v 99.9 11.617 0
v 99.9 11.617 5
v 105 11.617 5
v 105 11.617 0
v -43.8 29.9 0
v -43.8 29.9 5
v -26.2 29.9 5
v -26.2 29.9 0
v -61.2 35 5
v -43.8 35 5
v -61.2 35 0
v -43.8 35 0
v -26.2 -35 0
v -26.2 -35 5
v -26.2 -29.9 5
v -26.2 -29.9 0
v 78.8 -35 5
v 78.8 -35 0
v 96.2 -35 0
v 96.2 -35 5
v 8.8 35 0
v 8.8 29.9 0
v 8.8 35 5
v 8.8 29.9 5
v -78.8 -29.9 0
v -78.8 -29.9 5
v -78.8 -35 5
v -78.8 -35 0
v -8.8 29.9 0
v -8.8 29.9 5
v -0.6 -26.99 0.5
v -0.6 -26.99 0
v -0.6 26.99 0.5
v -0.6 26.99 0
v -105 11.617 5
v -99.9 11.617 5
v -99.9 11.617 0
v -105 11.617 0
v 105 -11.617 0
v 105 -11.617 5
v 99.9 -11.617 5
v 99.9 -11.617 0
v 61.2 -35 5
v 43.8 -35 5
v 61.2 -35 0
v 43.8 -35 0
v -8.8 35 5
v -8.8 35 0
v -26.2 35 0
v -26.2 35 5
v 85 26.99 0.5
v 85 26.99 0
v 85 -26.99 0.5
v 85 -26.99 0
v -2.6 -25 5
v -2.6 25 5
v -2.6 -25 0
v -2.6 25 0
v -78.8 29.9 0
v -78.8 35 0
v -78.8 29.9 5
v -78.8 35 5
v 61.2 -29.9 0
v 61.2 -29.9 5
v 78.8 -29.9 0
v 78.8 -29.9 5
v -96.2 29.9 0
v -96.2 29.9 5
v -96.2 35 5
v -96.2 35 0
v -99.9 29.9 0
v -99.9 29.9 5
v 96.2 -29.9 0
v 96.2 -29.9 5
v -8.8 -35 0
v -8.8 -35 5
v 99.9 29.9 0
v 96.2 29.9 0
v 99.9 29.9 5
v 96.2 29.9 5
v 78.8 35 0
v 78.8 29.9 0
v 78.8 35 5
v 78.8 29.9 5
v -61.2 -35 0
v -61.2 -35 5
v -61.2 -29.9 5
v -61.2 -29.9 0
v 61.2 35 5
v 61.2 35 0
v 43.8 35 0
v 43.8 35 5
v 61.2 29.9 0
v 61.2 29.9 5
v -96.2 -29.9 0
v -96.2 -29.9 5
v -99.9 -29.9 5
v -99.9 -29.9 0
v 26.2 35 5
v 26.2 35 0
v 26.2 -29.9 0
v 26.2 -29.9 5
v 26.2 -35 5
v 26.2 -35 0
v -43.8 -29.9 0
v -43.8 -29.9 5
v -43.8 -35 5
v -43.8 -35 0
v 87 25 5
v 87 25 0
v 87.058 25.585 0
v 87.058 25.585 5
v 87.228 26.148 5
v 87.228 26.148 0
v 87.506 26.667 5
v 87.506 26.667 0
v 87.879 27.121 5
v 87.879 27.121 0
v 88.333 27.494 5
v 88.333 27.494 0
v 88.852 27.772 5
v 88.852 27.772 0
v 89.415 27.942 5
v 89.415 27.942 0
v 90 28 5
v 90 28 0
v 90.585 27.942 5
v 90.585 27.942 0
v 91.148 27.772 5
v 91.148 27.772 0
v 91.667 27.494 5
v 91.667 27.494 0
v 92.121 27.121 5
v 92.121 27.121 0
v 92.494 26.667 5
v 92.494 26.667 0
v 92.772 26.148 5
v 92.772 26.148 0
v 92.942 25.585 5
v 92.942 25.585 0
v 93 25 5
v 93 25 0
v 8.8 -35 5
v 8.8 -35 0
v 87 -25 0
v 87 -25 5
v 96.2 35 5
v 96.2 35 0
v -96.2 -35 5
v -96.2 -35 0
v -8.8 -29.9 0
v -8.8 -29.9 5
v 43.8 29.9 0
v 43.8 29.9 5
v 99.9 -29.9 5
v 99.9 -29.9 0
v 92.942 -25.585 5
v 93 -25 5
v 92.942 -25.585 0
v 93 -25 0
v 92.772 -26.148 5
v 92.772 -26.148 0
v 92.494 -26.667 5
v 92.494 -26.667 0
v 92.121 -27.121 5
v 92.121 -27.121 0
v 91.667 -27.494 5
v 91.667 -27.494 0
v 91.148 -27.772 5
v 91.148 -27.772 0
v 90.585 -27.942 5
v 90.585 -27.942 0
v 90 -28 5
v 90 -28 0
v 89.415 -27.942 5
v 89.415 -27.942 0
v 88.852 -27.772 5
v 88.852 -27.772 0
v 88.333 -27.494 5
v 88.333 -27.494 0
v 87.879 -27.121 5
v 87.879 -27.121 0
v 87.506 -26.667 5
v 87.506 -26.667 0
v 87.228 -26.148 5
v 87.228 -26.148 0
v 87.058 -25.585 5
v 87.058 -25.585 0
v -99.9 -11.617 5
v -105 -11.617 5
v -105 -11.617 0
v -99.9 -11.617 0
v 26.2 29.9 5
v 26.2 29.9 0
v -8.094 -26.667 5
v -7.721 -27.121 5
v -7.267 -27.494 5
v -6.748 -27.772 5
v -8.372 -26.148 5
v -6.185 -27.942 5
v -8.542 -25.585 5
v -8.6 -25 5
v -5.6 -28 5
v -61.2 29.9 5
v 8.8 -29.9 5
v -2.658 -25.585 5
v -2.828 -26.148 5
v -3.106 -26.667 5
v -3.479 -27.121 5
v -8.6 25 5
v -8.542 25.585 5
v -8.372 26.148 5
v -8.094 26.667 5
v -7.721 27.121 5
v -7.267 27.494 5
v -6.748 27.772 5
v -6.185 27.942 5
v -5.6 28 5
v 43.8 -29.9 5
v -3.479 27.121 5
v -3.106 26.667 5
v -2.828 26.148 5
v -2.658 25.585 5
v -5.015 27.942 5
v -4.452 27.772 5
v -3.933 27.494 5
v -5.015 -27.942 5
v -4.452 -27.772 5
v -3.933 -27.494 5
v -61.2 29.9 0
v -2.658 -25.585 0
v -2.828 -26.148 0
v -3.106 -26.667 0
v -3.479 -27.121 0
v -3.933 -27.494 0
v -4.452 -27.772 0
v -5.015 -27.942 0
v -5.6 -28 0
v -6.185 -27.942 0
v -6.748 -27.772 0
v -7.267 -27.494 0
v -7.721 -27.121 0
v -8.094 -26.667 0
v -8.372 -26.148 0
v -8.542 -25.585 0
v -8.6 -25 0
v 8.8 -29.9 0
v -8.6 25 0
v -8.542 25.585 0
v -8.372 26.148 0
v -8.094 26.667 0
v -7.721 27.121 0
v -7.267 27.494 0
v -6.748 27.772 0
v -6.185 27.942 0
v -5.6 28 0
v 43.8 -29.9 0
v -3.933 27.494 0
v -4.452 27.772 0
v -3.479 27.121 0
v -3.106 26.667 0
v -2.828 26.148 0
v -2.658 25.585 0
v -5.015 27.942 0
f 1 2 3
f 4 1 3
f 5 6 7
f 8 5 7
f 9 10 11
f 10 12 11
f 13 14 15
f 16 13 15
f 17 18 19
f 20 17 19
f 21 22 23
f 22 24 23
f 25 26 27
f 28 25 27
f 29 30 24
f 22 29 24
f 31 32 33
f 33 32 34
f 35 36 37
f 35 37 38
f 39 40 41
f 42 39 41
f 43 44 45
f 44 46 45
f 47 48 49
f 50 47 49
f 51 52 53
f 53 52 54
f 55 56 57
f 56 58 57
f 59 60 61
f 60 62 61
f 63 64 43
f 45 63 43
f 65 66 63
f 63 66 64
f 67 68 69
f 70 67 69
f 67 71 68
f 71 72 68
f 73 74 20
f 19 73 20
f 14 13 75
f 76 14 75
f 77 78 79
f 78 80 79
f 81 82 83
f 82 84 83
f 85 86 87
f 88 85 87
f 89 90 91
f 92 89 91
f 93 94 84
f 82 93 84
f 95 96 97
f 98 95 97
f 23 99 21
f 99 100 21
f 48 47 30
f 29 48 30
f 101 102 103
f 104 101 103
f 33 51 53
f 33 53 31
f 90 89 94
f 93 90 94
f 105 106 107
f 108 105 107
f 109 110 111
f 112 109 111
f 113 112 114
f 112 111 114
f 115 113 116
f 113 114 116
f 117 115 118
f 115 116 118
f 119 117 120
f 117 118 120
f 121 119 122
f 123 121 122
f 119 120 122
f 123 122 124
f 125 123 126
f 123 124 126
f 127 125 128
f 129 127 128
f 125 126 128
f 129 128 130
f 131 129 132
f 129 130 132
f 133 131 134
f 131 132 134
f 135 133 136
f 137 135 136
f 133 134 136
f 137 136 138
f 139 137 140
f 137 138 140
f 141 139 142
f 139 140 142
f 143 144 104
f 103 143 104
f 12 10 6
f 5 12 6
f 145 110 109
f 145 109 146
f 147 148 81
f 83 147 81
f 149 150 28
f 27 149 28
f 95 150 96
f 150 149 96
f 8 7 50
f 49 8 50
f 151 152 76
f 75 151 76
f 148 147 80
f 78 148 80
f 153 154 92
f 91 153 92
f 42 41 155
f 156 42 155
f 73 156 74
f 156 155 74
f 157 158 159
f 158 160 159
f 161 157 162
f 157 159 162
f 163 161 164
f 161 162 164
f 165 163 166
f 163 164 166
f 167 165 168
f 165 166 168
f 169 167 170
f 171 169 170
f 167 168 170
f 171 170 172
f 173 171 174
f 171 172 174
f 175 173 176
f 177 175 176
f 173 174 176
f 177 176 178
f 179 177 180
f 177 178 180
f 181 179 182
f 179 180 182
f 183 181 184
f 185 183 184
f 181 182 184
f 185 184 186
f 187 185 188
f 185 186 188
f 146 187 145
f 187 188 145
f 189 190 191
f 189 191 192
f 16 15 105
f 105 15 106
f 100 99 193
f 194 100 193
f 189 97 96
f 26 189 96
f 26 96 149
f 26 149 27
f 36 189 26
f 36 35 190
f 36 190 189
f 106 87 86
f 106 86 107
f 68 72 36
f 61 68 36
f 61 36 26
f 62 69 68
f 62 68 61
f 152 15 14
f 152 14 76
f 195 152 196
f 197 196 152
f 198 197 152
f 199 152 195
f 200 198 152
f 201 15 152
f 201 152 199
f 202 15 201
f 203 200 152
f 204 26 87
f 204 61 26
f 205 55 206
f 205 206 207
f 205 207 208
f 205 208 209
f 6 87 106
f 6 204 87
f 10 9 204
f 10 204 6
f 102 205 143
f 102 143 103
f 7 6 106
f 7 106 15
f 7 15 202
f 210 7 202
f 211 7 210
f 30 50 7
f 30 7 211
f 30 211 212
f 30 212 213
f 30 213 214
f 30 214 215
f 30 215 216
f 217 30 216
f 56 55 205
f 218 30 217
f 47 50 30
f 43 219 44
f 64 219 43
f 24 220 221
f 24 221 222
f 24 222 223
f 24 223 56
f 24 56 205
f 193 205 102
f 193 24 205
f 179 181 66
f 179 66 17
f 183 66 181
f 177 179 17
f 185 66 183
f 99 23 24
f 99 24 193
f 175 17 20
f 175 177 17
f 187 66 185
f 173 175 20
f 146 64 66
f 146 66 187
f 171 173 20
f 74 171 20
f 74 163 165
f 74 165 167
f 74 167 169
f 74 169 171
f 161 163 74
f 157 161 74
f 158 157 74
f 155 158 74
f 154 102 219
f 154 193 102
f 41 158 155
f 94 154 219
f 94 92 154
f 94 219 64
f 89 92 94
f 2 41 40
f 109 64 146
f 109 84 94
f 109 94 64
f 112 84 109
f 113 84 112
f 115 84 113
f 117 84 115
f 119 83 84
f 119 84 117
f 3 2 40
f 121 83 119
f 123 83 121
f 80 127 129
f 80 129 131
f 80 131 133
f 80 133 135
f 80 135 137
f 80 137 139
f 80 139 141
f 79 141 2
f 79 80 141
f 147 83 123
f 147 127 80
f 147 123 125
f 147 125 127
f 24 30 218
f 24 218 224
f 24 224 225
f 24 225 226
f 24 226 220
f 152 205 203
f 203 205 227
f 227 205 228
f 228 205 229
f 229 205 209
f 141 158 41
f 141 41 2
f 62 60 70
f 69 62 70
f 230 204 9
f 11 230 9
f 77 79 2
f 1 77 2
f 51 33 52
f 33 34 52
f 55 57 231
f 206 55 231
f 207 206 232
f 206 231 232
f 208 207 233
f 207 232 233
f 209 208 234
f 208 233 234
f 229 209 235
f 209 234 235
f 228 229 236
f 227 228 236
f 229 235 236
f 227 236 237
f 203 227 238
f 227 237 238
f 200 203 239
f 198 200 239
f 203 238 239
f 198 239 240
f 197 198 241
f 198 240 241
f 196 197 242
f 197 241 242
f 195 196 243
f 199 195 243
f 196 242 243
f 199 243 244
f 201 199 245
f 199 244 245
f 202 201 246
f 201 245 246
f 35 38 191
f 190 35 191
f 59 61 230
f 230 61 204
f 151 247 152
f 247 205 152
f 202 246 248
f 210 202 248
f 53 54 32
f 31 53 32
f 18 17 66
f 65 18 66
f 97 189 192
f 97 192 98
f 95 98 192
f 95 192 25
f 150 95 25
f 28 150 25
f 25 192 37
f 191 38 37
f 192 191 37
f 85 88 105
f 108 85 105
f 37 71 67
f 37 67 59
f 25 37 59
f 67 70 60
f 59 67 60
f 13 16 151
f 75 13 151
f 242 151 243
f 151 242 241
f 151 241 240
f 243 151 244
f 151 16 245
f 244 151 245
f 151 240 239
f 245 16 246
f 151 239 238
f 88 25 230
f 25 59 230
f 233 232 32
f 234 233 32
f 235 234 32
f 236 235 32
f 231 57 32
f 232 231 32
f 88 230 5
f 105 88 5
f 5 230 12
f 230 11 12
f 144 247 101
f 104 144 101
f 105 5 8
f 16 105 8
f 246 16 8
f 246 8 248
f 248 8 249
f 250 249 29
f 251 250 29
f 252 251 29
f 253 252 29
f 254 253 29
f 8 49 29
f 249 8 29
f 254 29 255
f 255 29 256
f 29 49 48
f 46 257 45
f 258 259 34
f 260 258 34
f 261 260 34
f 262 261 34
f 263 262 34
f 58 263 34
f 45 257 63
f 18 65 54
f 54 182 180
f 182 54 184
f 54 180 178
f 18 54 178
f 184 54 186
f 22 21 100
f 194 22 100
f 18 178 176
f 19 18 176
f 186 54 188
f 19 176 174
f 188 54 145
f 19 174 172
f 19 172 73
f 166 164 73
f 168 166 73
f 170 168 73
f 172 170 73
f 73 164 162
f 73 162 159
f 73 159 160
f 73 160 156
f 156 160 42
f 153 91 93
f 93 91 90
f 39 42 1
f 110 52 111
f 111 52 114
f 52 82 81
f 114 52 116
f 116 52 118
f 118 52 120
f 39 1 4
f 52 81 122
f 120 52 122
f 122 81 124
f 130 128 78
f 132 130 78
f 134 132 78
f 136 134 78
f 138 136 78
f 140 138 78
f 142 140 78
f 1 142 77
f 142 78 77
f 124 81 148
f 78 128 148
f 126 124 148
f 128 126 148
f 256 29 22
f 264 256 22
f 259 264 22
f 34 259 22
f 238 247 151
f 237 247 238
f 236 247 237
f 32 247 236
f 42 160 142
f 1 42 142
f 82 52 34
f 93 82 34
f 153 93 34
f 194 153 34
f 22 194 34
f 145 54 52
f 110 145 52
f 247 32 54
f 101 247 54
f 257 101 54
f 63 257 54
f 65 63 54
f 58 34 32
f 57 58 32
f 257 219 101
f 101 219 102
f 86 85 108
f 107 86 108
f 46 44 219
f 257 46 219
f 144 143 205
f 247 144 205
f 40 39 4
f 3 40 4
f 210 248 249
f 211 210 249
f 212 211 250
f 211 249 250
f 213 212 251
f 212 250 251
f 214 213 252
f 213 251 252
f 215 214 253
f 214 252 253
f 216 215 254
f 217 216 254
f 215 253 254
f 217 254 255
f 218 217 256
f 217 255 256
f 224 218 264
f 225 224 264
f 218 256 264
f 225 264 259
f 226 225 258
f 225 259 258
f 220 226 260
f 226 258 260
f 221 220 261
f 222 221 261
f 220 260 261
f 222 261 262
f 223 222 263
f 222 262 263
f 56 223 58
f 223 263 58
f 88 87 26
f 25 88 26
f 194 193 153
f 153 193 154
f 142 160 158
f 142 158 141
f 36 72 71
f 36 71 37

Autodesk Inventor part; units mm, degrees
ref_plane "YZ Plane" through (0, 0, 0) normal (1, 0, 0) x (0, 1, 0)
ref_plane "XZ Plane" through (0, 0, 0) normal (0, 1, 0) x (-1, 0, 0)
ref_plane "XY Plane" through (0, 0, 0) normal (0, 0, 1) x (1, 0, 0)
sketch "Sketch1" plane through (0, 0, 0) normal (0, 0, 1) x (1, 0, 0)
  line L0 (-105, -35) -> (105, -35)
  line L1 (105, -35) -> (105, 35)
  line L2 (105, 35) -> (-105, 35)
  line L3 (-105, 35) -> (-105, -35)
  line L4 (-105, -35) -> (105, 35) construction
  line L5 (105, -35) -> (-105, 35) construction
  point P0 (0, 0)
  dimension "d0" = 210
  dimension "d1" = 70
extrude "Extrusion1" add sketch "Sketch1" along normal blind 5
sketch "Sketch2" plane through (0, 0, 5) normal (0, 0, 1) x (1, 0, 0)
  line L0 (105, 35) -> (-105, 35) projected
  line L1 (-8.8, 35) -> (-8.8, 29.9)
  line L2 (-8.8, 29.9) -> (8.8, 29.9)
  line L3 (8.8, 29.9) -> (8.8, 35)
  line L4 (-43.8, 35) -> (-43.8, 29.9)
  line L5 (-43.8, 29.9) -> (-26.2, 29.9)
  line L6 (-26.2, 29.9) -> (-26.2, 35)
  line L7 (-78.8, 35) -> (-78.8, 29.9)
  line L8 (-78.8, 29.9) -> (-61.2, 29.9)
  line L9 (-61.2, 29.9) -> (-61.2, 35)
  line L10 (-113.8, 35) -> (-113.8, 29.9)
  line L11 (-113.8, 29.9) -> (-96.2, 29.9)
  line L12 (-96.2, 29.9) -> (-96.2, 35)
  line L13 (43.8, 29.9) -> (43.8, 35)
  line L14 (26.2, 29.9) -> (43.8, 29.9)
  line L15 (26.2, 35) -> (26.2, 29.9)
  line L16 (78.8, 29.9) -> (78.8, 35)
  line L17 (61.2, 29.9) -> (78.8, 29.9)
  line L18 (61.2, 35) -> (61.2, 29.9)
  line L19 (113.8, 29.9) -> (113.8, 35)
  line L20 (96.2, 29.9) -> (113.8, 29.9)
  line L21 (96.2, 35) -> (96.2, 29.9)
  line L22 (105, -35) -> (105, 35) projected
  line L23 (105, 35) -> (-105, 35) projected
  line L24 (-105, 35) -> (-105, -35) projected
  line L25 (-105, -35) -> (105, -35) projected
  line L26 (-99.9, 29.9) -> (-99.9, 11.6167)
  line L27 (-99.9, 11.6167) -> (-105, 11.6167)
  line L28 (99.9, 29.9) -> (99.9, 11.6167)
  line L29 (99.9, 11.6167) -> (105, 11.6167)
  point P0 (0, 0)
  point P1 (0, 35)
  point P2 (0, 29.9)
  point P3 (-8.8, 32.45)
  point P4 (8.8, 32.45)
  point P5 (-43.8, 32.45)
  point P6 (-35, 29.9)
  point P7 (-26.2, 32.45)
  point P8 (-35, 35)
  point P9 (-78.8, 32.45)
  point P10 (-70, 29.9)
  point P11 (-61.2, 32.45)
  point P12 (-70, 35)
  point P13 (-113.8, 32.45)
  point P14 (-105, 29.9)
  point P15 (-96.2, 32.45)
  point P16 (-105, 35)
  point P17 (26.2, 32.45)
  point P18 (35, 35)
  point P19 (35, 29.9)
  point P20 (43.8, 32.45)
  point P21 (61.2, 32.45)
  point P22 (70, 35)
  point P23 (70, 29.9)
  point P24 (78.8, 32.45)
  point P25 (96.2, 32.45)
  point P26 (105, 35)
  point P27 (105, 29.9)
  point P28 (113.8, 32.45)
  point P29 (105, 29.9)
  point P30 (-105, 35)
  point P31 (-105, 29.9)
  point P32 (-102.45, 11.6167)
  dimension "d4" = 5.1
  dimension "d5" = 17.6
  dimension "d6" = 210
  dimension "d24" = 35
  dimension "d31" = 35
  dimension "d36" = 70
  dimension "d37" = 23.3833
extrude "Extrusion2" cut sketch "Sketch2" against normal blind 5 contours L22 L20 L21 L0 | L22 L29 L28 L20 | L16 L17 L18 L0 | L13 L14 L15 L0 | L24 L11 L26 L27 | L3 L2 L1 L0 | L24 L0 L12 L11 | L6 L5 L4 L0 | L0 L9 L8 L7
sketch "Sketch4" plane through (0, 0, 0) normal (0, 0, -1) x (-1, 0, 0)
  line L0 (-85, -26.99) -> (0.6, -26.99)
  line L1 (0.6, -26.99) -> (0.6, 26.99)
  line L2 (0.6, 26.99) -> (-85, 26.99)
  line L3 (-85, 26.99) -> (-85, -26.99)
  line L4 (-85, -26.99) -> (0.6, 26.99) construction
  line L5 (0.6, -26.99) -> (-85, 26.99) construction
  line L6 (-105, -35) -> (-105, 35) projected
  line L7 (-85, 26.99) -> (0.0055, 26.99) construction
  line L8 (0.0055, 26.99) -> (0.0055, -27.0274) construction
  line L9 (0.0055, -27.0274) -> (-85, -27.0274) construction
  line L10 (-85, -27.0274) -> (-85, 26.99) construction
  point P0 (0, 0)
  point P1 (-42.2, 0)
  point P2 (-105, 29.9)
  dimension "d16" = 53.98
  dimension "d17" = 85.6
  dimension "d18" = 20
extrude "Extrusion4" cut sketch "Sketch4" against normal blind 0.5
sketch "Sketch3" plane through (0, 0, 0) normal (0, 0, -1) x (-1, 0, 0)
  line L0 (8.6, 25) -> (2.6, 25) construction
  line L1 (2.6, 25) -> (2.6, -25)
  line L2 (2.6, -25) -> (8.6, -25) construction
  line L3 (8.6, -25) -> (8.6, 25)
  line L4 (8.6, 25) -> (2.6, -25) construction
  line L5 (2.6, 25) -> (8.6, -25) construction
  arc A0 (2.6, -25) -> (8.6, -25) centre (5.6, -25) ccw
  arc A1 (8.6, 25) -> (2.6, 25) centre (5.6, 25) ccw
  line L6 (0.6, 26.99) -> (0.6, -26.99) projected
  line L7 (-85, 26.99) -> (0.6, 26.99) projected
  line L8 (-42.2, 26.99) -> (-42.2, -26.99)
  line L9 (0.6, -26.99) -> (-85, -26.99) projected
  line L10 (-93, 25) -> (-87, 25) construction
  line L11 (-87, 25) -> (-87, -25)
  line L12 (-87, -25) -> (-93, -25) construction
  line L13 (-93, -25) -> (-93, 25)
  line L14 (-93, 25) -> (-87, -25) construction
  line L15 (-87, 25) -> (-93, -25) construction
  arc A2 (-93, -25) -> (-87, -25) centre (-90, -25) ccw
  arc A3 (-87, 25) -> (-93, 25) centre (-90, 25) ccw
  point P0 (0, 0)
  point P1 (5.6, 0)
  point P2 (-90, 0)
  dimension "d12" = 6
  dimension "d13" = 50
  dimension "d21" = 5
extrude "Extrusion3" cut sketch "Sketch3" against normal blind 5 contours A1 L3 A0 L1 | L11 A2 L13 A3
mirror "Mirror2" about plane through (0, 0, 0) normal (0, 1, 0) of "Extrusion2"
sketch "Sketch5" plane through (0, 0, 0.5) normal (0, 0, -1) x (-1, 0, 0)
  line L0 (-85, 26.99) -> (0.0055, 26.99) construction
  line L1 (0.0055, 26.99) -> (0.0055, -27.0274) construction
  line L2 (0.0055, -27.0274) -> (-85, -27.0274) construction
  line L3 (-85, -27.0274) -> (-85, 26.99) construction
  point P0 (0, 0)
equation "\"d24\" = 0.166667 * d6"
equation "\"d31\" = 0.166667 * d6"
properties part number "FloorPlate" material "MDF Medium Density Fiberboard"
